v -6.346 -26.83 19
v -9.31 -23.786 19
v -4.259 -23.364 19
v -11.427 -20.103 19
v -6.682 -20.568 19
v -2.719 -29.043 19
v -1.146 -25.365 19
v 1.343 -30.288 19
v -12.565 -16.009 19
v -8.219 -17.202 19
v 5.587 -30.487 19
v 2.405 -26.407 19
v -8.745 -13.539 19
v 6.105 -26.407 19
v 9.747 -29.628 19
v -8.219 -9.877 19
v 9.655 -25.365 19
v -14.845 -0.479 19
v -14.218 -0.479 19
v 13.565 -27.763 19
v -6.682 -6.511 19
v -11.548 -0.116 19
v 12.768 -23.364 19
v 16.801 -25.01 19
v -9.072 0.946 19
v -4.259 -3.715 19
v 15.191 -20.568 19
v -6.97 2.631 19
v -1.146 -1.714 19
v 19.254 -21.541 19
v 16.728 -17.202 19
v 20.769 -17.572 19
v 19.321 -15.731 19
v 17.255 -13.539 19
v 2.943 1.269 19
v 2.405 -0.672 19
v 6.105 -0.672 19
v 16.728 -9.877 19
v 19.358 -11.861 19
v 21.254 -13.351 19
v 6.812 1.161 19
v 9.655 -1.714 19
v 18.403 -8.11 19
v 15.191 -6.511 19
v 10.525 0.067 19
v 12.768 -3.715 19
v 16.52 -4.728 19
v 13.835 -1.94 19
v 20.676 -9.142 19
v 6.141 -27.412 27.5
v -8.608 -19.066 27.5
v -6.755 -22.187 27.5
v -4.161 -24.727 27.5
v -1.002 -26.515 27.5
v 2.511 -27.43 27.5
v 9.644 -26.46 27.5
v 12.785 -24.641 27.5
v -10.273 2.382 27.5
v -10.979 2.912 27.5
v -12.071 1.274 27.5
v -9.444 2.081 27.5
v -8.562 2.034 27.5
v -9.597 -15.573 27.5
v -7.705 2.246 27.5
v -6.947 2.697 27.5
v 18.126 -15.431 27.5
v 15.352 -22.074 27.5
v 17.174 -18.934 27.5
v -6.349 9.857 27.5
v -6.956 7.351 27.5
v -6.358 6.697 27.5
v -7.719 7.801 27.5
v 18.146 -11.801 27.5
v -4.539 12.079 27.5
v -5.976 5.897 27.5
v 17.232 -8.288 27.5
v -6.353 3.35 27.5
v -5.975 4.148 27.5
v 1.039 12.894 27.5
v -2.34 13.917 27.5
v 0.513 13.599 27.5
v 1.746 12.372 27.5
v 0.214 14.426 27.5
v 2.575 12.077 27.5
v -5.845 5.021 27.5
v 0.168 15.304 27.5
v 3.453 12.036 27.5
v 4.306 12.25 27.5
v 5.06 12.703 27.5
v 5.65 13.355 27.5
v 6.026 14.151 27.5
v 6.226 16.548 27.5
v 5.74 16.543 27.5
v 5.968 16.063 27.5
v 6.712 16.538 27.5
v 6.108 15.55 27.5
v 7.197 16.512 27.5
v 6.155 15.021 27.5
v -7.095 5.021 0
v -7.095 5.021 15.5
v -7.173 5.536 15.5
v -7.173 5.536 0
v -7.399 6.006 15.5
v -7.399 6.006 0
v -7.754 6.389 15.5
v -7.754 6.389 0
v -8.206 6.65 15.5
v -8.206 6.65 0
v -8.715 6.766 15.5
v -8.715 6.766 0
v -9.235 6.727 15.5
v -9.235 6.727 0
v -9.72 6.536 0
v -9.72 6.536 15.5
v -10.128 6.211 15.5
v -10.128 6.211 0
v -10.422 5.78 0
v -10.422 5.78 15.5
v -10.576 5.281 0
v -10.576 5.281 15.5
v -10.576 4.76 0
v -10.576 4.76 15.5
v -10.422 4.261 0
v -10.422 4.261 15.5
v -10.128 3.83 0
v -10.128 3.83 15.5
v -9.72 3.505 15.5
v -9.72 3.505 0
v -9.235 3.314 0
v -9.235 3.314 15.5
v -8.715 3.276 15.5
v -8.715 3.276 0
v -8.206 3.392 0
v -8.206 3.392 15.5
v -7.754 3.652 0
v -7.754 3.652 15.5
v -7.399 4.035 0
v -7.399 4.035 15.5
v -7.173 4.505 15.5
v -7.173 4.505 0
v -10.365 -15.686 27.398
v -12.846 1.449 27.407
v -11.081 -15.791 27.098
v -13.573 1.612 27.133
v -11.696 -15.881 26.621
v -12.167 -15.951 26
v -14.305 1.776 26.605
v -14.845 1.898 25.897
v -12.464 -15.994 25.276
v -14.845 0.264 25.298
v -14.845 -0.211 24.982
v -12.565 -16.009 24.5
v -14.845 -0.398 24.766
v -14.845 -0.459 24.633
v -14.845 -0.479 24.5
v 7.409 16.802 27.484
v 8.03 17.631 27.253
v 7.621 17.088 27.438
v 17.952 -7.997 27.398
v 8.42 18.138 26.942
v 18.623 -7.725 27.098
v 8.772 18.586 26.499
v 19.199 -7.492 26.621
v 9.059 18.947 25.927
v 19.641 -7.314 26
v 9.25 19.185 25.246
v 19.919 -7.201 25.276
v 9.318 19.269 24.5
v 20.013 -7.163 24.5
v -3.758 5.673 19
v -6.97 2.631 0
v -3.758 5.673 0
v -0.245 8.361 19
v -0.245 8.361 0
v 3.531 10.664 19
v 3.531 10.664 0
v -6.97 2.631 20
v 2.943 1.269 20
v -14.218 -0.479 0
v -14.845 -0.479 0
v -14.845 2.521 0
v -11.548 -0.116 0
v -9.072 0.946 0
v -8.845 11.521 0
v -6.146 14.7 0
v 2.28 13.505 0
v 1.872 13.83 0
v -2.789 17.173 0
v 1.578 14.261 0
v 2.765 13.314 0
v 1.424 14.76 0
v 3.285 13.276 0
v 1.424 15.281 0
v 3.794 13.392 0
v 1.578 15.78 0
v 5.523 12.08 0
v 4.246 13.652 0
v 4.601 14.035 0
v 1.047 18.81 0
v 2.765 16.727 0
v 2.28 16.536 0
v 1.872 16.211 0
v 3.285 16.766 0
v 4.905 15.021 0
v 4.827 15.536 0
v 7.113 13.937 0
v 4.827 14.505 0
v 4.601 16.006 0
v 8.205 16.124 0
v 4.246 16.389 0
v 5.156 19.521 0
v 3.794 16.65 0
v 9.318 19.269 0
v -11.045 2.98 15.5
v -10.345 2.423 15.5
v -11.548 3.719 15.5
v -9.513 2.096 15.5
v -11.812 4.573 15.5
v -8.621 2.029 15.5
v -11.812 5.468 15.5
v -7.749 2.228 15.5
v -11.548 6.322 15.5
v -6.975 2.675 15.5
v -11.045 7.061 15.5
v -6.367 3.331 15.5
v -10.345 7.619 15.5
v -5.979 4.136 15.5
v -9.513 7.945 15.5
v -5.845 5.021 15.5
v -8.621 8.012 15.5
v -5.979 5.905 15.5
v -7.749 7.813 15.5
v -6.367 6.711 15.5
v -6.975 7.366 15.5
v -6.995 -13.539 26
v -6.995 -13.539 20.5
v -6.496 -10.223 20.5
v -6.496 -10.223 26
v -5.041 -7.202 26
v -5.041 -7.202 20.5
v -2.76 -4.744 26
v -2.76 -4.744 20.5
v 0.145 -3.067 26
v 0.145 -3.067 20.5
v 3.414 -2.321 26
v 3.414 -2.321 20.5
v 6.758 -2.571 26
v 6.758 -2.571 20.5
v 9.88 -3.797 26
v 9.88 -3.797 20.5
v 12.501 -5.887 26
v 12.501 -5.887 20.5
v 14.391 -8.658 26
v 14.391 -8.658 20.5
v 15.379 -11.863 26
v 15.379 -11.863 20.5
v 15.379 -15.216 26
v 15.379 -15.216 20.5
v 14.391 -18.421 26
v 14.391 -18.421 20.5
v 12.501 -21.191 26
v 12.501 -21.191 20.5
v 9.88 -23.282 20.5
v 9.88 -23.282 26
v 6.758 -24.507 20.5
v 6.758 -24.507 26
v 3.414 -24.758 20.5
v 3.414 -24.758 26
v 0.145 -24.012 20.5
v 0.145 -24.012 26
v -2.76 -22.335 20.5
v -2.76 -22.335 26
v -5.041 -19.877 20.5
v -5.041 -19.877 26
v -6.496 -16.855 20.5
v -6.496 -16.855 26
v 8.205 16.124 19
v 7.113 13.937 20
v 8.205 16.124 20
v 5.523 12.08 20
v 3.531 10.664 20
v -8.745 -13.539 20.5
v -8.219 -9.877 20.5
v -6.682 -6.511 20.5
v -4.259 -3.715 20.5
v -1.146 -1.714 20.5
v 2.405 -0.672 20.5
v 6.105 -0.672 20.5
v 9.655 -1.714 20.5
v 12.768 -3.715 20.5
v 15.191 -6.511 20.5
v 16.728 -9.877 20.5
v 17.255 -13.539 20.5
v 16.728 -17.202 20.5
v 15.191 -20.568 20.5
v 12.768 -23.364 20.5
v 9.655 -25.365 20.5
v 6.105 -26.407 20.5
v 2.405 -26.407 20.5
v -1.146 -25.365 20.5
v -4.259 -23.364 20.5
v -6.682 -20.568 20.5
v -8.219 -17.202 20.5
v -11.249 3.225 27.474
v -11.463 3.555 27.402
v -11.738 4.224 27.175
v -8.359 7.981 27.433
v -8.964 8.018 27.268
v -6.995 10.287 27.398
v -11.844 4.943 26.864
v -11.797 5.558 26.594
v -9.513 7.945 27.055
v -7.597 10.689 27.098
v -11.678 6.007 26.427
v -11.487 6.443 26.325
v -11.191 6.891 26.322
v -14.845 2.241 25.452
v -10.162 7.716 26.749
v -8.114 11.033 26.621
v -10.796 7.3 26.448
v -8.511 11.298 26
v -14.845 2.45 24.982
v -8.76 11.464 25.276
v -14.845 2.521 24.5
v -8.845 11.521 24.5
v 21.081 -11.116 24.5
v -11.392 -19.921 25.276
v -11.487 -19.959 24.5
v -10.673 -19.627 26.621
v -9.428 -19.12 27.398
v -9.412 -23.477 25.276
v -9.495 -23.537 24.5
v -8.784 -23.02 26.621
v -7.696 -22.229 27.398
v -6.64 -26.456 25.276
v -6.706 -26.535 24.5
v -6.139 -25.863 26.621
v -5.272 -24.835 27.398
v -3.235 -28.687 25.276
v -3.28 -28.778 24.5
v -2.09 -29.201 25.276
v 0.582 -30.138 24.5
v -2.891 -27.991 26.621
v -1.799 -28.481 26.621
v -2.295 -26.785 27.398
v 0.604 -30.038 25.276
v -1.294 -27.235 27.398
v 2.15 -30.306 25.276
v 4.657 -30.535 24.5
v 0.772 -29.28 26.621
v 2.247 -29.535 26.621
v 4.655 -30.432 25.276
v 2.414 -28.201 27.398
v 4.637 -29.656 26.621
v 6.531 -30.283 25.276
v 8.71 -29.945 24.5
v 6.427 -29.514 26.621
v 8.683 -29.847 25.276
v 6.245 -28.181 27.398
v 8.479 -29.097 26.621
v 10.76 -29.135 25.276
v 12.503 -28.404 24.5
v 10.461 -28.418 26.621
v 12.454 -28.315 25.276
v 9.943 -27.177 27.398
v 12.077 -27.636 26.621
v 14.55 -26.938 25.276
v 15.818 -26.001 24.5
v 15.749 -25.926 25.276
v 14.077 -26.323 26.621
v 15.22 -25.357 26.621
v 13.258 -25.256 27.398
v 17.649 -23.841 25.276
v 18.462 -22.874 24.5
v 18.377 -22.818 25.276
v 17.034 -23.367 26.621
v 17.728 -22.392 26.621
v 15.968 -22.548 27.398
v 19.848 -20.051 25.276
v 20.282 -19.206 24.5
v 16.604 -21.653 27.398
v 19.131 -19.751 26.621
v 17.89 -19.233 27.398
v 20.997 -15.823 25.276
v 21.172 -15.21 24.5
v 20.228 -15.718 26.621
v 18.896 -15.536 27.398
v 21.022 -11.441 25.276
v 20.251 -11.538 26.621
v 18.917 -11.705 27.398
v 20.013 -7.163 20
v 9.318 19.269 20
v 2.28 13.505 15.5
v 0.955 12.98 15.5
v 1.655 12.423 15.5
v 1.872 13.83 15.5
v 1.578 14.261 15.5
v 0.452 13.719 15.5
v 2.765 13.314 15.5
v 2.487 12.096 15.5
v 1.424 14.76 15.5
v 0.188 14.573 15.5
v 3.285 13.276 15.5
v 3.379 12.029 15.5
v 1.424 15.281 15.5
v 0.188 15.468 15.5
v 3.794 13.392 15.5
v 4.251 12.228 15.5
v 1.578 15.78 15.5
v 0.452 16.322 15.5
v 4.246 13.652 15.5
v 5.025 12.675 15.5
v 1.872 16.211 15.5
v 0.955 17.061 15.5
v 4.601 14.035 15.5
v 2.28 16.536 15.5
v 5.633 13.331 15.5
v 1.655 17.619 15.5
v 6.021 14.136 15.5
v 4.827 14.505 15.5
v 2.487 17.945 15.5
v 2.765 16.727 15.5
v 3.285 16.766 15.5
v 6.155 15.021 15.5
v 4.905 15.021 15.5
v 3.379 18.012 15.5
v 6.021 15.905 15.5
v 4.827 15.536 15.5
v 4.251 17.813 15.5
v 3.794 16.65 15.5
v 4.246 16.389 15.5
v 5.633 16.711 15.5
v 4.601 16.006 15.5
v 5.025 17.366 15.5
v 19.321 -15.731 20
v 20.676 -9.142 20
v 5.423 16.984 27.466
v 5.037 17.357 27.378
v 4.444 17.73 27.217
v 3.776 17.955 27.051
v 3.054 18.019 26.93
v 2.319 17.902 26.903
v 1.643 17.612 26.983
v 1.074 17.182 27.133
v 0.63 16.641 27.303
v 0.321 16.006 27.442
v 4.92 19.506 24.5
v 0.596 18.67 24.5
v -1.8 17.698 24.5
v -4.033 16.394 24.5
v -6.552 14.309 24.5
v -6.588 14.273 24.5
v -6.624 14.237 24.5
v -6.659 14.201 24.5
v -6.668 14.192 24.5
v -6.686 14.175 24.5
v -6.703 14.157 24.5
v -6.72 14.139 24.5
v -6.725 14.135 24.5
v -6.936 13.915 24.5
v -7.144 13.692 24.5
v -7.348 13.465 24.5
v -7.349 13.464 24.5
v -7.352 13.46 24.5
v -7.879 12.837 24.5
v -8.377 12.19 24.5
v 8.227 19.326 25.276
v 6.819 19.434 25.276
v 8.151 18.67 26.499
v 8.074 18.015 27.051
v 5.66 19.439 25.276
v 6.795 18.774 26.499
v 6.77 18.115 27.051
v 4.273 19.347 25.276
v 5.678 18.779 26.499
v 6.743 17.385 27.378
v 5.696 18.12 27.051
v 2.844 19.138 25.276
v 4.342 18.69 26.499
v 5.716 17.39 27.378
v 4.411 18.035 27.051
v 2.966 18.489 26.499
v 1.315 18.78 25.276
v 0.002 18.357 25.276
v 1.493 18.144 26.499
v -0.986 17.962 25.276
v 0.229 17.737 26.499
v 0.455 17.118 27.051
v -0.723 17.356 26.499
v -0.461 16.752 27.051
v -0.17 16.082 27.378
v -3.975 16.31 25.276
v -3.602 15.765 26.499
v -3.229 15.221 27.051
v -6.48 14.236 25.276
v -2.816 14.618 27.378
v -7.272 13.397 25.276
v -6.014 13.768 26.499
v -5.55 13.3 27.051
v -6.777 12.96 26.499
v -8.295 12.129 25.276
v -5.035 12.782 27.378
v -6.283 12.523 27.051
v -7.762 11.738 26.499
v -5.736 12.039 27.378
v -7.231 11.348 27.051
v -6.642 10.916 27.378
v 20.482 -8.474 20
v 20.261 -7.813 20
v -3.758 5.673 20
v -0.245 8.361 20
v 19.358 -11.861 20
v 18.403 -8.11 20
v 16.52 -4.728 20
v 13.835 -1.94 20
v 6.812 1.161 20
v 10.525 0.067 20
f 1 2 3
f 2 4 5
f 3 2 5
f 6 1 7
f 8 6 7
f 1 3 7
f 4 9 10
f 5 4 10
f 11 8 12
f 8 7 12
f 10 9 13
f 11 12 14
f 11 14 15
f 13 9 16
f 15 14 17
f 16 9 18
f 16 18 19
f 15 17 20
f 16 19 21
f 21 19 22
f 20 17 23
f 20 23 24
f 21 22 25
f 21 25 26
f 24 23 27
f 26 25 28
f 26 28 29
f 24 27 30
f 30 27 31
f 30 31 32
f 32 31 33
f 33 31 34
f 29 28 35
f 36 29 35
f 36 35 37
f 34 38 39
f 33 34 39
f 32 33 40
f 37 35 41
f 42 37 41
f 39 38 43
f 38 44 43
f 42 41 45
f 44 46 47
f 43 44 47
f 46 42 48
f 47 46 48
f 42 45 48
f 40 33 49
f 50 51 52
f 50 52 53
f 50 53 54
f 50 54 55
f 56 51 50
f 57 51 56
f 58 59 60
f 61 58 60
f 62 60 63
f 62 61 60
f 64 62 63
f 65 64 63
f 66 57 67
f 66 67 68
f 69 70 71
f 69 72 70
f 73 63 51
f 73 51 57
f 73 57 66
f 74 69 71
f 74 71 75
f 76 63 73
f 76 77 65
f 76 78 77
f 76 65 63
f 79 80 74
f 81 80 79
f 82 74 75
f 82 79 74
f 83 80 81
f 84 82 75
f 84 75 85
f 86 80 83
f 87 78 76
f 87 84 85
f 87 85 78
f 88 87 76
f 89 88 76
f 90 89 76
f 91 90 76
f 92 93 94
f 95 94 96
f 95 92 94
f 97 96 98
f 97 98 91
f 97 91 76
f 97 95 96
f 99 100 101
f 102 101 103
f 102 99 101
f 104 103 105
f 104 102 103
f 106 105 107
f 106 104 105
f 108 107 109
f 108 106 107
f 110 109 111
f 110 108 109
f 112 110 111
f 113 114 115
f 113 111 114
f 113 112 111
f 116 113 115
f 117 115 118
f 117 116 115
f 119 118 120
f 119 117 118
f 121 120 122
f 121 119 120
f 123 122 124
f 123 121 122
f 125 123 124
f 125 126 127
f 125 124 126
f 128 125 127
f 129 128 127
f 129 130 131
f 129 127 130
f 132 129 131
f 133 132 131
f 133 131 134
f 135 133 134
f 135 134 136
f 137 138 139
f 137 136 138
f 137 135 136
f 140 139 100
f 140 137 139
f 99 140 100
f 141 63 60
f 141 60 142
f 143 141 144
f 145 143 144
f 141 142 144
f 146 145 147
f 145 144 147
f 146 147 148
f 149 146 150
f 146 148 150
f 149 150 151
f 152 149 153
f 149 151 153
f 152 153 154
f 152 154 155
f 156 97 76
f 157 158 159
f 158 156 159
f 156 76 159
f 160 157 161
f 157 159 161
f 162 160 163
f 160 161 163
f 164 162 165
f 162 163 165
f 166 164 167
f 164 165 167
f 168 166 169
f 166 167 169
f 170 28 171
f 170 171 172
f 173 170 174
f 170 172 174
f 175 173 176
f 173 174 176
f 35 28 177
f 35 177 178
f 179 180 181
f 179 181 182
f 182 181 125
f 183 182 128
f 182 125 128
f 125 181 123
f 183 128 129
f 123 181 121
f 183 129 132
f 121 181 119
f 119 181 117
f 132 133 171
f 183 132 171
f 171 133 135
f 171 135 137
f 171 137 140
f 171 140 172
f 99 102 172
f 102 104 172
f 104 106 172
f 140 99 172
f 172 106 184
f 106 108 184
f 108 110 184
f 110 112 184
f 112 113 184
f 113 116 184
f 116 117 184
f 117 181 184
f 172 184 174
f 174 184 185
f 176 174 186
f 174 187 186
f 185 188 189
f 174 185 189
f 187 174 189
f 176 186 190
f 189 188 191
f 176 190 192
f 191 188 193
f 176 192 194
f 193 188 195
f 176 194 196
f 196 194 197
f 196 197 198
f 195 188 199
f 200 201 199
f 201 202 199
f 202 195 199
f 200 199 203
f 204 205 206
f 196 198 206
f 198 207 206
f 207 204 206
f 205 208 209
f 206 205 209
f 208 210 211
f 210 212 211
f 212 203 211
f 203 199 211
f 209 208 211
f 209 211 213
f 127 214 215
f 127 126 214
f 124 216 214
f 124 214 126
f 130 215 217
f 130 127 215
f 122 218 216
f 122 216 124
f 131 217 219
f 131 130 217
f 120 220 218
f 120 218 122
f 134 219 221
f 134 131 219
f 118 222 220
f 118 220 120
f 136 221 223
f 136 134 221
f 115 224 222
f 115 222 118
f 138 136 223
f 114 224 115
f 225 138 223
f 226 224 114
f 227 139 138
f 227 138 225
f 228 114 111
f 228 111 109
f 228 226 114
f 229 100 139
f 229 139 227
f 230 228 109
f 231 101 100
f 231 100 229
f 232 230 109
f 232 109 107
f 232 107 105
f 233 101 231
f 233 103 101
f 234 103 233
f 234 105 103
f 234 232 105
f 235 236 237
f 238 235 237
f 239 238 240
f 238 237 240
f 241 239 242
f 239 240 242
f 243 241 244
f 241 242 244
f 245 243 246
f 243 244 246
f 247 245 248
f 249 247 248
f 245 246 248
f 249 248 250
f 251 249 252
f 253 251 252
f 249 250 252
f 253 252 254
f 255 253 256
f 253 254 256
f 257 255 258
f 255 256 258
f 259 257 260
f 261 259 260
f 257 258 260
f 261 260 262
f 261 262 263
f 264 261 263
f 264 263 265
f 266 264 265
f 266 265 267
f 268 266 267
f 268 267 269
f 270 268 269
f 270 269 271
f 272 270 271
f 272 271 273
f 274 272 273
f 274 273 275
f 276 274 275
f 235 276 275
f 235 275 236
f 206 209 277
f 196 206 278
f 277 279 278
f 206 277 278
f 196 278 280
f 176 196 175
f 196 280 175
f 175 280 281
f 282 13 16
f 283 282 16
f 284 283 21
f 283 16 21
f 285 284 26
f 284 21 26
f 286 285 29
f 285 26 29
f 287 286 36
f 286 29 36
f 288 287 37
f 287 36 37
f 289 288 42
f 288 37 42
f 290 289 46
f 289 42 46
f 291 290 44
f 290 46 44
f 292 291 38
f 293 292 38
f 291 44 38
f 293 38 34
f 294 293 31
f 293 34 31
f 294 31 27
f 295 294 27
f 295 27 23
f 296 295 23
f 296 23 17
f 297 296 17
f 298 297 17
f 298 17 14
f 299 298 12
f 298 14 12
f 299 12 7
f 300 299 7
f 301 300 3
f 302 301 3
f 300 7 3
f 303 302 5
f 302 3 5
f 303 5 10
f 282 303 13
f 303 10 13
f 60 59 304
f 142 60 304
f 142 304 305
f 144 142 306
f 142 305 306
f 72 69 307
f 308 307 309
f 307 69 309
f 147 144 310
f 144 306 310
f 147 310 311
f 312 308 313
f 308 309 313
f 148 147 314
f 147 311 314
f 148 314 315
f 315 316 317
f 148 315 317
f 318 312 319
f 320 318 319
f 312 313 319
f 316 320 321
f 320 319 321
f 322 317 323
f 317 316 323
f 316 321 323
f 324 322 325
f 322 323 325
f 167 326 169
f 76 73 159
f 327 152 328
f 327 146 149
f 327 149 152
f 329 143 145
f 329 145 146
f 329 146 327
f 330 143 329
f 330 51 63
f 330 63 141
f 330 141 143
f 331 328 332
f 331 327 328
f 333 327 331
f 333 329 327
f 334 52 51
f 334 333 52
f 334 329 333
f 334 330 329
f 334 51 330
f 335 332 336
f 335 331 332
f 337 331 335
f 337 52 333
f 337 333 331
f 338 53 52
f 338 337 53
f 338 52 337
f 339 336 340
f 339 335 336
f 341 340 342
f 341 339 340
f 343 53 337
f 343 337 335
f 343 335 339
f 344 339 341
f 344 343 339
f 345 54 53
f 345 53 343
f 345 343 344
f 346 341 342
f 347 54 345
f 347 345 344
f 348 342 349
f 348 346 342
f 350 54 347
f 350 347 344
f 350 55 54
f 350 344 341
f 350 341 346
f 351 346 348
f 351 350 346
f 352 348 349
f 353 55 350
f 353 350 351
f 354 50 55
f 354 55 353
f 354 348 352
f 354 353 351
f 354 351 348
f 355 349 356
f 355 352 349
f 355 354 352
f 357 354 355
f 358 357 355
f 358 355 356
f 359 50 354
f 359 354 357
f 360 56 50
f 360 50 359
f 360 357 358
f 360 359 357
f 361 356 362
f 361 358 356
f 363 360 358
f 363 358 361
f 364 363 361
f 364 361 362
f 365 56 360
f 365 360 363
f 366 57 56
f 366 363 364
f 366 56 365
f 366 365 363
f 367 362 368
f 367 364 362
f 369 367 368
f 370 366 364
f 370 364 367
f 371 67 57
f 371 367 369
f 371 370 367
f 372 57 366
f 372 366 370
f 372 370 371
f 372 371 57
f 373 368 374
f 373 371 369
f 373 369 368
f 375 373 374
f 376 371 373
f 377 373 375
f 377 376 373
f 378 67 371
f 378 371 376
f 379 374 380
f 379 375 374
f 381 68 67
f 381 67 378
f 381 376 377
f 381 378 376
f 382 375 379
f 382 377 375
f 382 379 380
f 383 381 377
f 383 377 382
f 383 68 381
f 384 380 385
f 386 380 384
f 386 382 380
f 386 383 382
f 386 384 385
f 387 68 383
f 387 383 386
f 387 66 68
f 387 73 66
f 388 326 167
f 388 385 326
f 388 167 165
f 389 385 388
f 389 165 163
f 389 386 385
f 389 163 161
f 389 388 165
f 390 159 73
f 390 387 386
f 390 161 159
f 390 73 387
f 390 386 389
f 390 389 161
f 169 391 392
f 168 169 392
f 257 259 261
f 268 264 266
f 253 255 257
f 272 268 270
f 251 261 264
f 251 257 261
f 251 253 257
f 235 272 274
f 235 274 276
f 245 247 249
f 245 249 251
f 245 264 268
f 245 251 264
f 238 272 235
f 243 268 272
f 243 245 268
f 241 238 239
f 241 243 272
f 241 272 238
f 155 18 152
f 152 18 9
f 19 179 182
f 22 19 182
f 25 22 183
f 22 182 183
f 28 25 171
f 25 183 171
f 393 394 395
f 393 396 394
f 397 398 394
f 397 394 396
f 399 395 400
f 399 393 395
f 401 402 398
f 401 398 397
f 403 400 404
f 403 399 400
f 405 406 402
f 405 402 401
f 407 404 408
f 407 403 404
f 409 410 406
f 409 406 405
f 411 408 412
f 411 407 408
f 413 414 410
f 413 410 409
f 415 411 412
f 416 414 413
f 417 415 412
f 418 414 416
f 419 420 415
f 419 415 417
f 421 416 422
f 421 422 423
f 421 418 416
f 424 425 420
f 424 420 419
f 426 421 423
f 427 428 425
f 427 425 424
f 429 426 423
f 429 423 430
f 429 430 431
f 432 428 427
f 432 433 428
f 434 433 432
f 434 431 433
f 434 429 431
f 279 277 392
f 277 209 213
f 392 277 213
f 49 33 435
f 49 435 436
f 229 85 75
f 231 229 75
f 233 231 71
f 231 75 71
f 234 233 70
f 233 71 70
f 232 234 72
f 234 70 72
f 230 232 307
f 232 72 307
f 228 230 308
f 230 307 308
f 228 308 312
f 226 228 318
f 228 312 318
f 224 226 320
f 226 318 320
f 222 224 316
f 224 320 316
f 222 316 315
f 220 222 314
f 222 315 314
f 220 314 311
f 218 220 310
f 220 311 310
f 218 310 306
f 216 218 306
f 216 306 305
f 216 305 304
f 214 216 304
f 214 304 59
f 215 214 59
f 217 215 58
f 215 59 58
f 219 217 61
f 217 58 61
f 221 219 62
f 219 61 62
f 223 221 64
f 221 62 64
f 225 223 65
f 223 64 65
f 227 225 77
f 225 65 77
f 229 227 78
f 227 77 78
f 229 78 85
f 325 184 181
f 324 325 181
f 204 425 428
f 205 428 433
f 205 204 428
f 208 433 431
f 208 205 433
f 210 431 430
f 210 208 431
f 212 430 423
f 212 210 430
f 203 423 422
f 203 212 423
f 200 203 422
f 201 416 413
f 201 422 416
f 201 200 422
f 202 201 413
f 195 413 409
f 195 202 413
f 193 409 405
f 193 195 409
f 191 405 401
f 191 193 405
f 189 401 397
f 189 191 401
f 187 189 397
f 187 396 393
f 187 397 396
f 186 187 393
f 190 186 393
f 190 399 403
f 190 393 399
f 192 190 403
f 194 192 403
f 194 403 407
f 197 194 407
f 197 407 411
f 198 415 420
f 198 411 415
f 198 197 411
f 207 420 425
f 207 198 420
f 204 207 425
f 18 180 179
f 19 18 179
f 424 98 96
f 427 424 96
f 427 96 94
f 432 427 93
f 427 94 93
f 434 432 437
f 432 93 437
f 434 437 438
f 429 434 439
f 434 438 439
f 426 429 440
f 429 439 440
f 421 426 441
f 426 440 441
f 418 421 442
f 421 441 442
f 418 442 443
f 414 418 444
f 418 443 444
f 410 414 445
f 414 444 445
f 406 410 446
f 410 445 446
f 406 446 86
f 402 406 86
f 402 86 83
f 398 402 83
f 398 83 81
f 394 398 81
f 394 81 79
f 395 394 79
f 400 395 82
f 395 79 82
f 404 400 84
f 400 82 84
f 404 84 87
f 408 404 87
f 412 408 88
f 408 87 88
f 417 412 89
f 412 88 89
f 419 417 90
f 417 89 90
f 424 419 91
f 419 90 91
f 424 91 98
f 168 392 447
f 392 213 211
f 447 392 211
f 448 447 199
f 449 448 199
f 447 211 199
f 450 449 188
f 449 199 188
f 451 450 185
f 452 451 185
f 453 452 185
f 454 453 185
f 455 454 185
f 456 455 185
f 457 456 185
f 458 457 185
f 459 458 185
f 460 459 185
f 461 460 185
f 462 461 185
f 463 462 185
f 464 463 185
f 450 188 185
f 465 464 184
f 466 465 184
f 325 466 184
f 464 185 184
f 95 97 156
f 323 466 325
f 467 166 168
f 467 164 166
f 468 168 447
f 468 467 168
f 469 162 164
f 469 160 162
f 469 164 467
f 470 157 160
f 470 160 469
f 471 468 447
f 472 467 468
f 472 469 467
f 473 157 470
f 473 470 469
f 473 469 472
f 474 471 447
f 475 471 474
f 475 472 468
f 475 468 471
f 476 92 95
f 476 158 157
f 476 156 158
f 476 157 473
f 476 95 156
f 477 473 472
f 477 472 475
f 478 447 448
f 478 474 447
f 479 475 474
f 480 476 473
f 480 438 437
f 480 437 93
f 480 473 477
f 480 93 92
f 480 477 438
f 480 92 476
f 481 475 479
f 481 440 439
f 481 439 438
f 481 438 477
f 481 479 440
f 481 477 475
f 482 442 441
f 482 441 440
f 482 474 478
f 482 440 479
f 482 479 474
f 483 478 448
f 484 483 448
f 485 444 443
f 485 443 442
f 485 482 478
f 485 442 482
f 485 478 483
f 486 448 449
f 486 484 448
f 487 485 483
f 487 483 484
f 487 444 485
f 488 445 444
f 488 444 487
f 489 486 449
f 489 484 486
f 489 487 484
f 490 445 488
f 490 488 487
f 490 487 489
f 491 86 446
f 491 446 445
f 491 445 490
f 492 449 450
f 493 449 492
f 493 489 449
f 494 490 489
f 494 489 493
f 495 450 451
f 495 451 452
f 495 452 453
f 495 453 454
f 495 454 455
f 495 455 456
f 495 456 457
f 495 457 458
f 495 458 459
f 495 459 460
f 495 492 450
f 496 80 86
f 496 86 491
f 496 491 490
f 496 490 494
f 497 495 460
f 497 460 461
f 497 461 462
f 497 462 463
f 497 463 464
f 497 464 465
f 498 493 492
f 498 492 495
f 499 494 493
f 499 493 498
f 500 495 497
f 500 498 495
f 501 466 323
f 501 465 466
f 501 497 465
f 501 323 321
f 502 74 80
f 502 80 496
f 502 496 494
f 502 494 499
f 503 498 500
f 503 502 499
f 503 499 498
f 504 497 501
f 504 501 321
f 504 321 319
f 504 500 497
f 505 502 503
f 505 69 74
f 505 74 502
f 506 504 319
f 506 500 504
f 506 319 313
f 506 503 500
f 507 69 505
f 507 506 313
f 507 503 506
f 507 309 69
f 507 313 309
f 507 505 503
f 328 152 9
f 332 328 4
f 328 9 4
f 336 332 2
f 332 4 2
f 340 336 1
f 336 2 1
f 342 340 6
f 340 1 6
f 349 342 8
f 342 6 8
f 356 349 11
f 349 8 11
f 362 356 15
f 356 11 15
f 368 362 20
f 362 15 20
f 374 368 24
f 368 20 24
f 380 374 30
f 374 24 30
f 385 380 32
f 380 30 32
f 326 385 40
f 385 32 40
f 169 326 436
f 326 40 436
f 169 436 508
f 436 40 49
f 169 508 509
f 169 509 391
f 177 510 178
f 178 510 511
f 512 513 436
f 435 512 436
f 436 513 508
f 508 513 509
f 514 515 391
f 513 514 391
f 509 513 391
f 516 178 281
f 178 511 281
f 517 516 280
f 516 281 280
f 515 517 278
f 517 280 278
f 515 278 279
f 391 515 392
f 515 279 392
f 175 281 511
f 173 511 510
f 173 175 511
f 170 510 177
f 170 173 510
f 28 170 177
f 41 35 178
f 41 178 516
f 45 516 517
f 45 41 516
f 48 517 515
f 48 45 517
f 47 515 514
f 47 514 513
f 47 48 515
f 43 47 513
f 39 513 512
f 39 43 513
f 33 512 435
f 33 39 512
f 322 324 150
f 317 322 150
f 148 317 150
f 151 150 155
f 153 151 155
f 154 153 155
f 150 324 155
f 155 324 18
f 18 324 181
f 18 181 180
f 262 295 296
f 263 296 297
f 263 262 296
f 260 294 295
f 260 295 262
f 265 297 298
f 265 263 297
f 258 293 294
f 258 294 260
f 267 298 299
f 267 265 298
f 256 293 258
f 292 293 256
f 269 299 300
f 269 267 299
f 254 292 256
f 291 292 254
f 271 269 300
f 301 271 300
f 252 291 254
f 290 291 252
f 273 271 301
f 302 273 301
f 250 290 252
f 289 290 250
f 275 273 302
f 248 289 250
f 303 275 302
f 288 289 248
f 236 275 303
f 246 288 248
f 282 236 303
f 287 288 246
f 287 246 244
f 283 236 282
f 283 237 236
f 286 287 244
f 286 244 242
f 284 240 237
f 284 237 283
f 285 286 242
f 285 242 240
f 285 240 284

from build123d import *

# Parameters (mm, degrees)
SKETCH1_R                = 1.75
BOSS_EXTRUDE1_DEPTH      = 23
FILLET3_R                = 10
BOSS_EXTRUDE2_DEPTH      = 4.5
BOSS_EXTRUDE2_DEPTH_BACK = 4
SKETCH3_R                = 1.75
SKETCH4_R                = 11.25
CUT_EXTRUDE1_DEPTH       = 7
SKETCH5_R                = 13
CUT_EXTRUDE2_DEPTH       = 1.5
SKETCH6_R                = 3
CUT_EXTRUDE3_DEPTH       = 12
CUT_EXTRUDE4_DEPTH       = 1
FILLET7_R                = 3
FILLET8_R                = 10


with BuildPart() as part:
    # Sketch1 → Boss-Extrude1 (new body)
    with BuildSketch(Plane.XY):
        with BuildLine():
            Line((-8.845360825, 11.520618557), (-14.845360825, 2.520618557))
            Line((-14.845360825, 2.520618557), (-14.845360825, -0.479381443))
            Line((-14.845360825, -0.479381443), (-9.845360825, -0.479381443))
            Line((-9.845360825, -0.479381443), (-8.845360825, 0.520618557))
            ThreePointArc((-8.845360825, 0.520618557), (-1.696742799, 7.320595709), (6.83903909, 12.26861112))
            Line((6.83903909, 12.26861112), (9.318301605, 19.26861112))
            ThreePointArc((9.318301605, 19.26861112), (-0.918731235, 18.102760488), (-8.845360825, 11.520618557))
        make_face()
        with Locations((-8.845360825, 5.020618557)):
            Circle(SKETCH1_R, mode=Mode.SUBTRACT)
        with Locations((3.154639175, 15.020618557)):
            Circle(SKETCH1_R, mode=Mode.SUBTRACT)
    extrude(amount=BOSS_EXTRUDE1_DEPTH)

    # Fillet3
    # the kernel refuses this fillet: 10 mm, written as the material it takes off along each edge
    with BuildSketch(Plane(origin=(-9.845360825, -0.479381443, -10.932362995), x_dir=(-1, 0, 0), z_dir=(0, 0, 1))) as fillet3_piece_1:
        with BuildLine():
            CenterArc((4.372945198, -10), FILLET3_R, 90, 46.455884642)
            Line((-2.87549632, -3.110871204), (-3.600340471, -2.421958325))
            ThreePointArc((-3.600340471, -2.421958325), (-1.769425443, -0.361263367), (-0.707106781, 0.707106781))
            Line((-0.707106781, 0.707106781), (0, 1))
            Line((0, 1), (4.372945198, 1))
            Line((4.372945198, 1), (4.372945198, 0))
        make_face()
    extrude(amount=44.86472599, mode=Mode.SUBTRACT)

    # Sketch3 → Boss-Extrude2 (add, two sides: drawn at the far end of the back side and taken through both)
    with BuildSketch(Plane.XY.offset(23).offset(-BOSS_EXTRUDE2_DEPTH_BACK)):
        with BuildLine():
            Line((-14.845360825, 2.520618557), (-14.845360825, -0.479381443))
            Line((-14.845360825, -0.479381443), (-12.565000182, -16.009144975))
            ThreePointArc((-12.565000182, -16.009144975), (8.709502938, -29.945300767), (20.013420995, -7.162799635))
            Line((20.013420995, -7.162799635), (9.318301605, 19.26861112))
            ThreePointArc((9.318301605, 19.26861112), (-0.918731235, 18.102760488), (-8.845360825, 11.520618557))
            Line((-8.845360825, 11.520618557), (-14.845360825, 2.520618557))
        make_face()
        with Locations((3.154639175, 15.020618557)):
            Circle(SKETCH3_R, mode=Mode.SUBTRACT)
        with Locations((-8.845360825, 5.020618557)):
            Circle(SKETCH3_R, mode=Mode.SUBTRACT)
    extrude(amount=BOSS_EXTRUDE2_DEPTH + BOSS_EXTRUDE2_DEPTH_BACK)

    # Sketch4 → Cut-Extrude1 (cut)
    with BuildSketch(Plane(origin=(0, 0, 19), x_dir=(-1, 0, 0), z_dir=(0, 0, -1))):
        with Locations((-4.254639175, -13.539381443)):
            Circle(SKETCH4_R)
    extrude(amount=-CUT_EXTRUDE1_DEPTH, mode=Mode.SUBTRACT)

    # Sketch5 → Cut-Extrude2 (cut)
    with BuildSketch(Plane(origin=(0, 0, 19), x_dir=(-1, 0, 0), z_dir=(0, 0, -1))):
        with Locations((-4.254639175, -13.539381443)):
            Circle(SKETCH5_R)
    extrude(amount=-CUT_EXTRUDE2_DEPTH, mode=Mode.SUBTRACT)

    # Sketch6 → Cut-Extrude3 (cut)
    with BuildSketch(Plane.XY.offset(27.5)):
        with Locations((-8.845360825, 5.020618557)):
            Circle(SKETCH6_R)
        with Locations((3.154639175, 15.020618557)):
            Circle(SKETCH6_R)
    extrude(amount=-CUT_EXTRUDE3_DEPTH, mode=Mode.SUBTRACT)

    # Sketch7 → Cut-Extrude4 (cut)
    with BuildSketch(Plane(origin=(0, 0, 19), x_dir=(-1, 0, 0), z_dir=(0, 0, -1))):
        with BuildLine():
            Line((-19.320512006, -15.73138888), (-26.521187379, 19.26861112))
            Line((-26.521187379, 19.26861112), (-9.318301605, 19.26861112))
            Line((-9.318301605, 19.26861112), (-6.83903909, 12.26861112))
            ThreePointArc((-6.83903909, 12.26861112), (0.552528201, 8.148031782), (6.969864505, 2.631489761))
            Line((6.969864505, 2.631489761), (-2.943055137, 1.26861112))
            ThreePointArc((-2.943055137, 1.26861112), (-15.267616881, -3.247010549), (-19.320512006, -15.73138888))
        make_face()
    extrude(amount=-CUT_EXTRUDE4_DEPTH, mode=Mode.SUBTRACT)

    # Fillet7
    # the kernel refuses this fillet: 3 mm, written as the material it takes off along each edge
    with BuildSketch(Plane(origin=(-8.845360825, 11.520618557, 27.5), x_dir=(0, 0, -1), z_dir=(-0.554700196225229, -0.8320502943378438, 0))) as fillet7_piece_1:
        with BuildLine():
            CenterArc((FILLET7_R, FILLET7_R), FILLET7_R, 180, 90)
            Line((0, FILLET7_R), (0, 0))
            Line((0, 0), (FILLET7_R, 0))
        make_face()
    extrude(amount=18.316653826, mode=Mode.SUBTRACT)
    with BuildSketch(Plane(origin=(-18.114165499, 21.781905941, 27.5), x_dir=(0, 0, -1), z_dir=(0.14528020772302286, -0.9893905504116943, 0))) as fillet7_piece_2:
        with BuildLine():
            CenterArc((FILLET7_R, FILLET7_R), FILLET7_R, 180, 90)
            Line((0, FILLET7_R), (0, 0))
            Line((0, 0), (FILLET7_R, 0))
        make_face()
    extrude(amount=38.196292556, mode=Mode.SUBTRACT)
    with BuildSketch(Plane(origin=(4.254639175, -13.539381443, 27.5), x_dir=(-0.9893905504116943, -0.14528020772302197, 0), z_dir=(-0.14528020772302197, 0.9893905504116943, 0))) as fillet7_piece_3:
        with BuildLine():
            CenterArc((17 - FILLET7_R, -FILLET7_R), FILLET7_R, 0, 90)
            Line((17 - FILLET7_R, 0), (17, 0))
            Line((17, 0), (17, -FILLET7_R))
        make_face()
    revolve(axis=Axis((4.254639175, -13.539381443, 27.5), (0, 0, 1)), revolution_arc=193.67655813, mode=Mode.SUBTRACT)
    with BuildSketch(Plane(origin=(6.154639175, 1.520618557, 27.5), x_dir=(0.5584515746383966, 0.8295371232102247, 0), z_dir=(0.8295371232102247, -0.5584515746383966, 0))) as fillet7_piece_4:
        with BuildLine():
            CenterArc((18.027756377 - FILLET7_R, -FILLET7_R), FILLET7_R, 0, 90)
            Line((18.027756377 - FILLET7_R, 0), (18.027756377, 0))
            Line((18.027756377, 0), (18.027756377, -FILLET7_R))
        make_face()
    revolve(axis=Axis((6.154639175, 1.520618557, 27.5), (0, 0, 1)), revolution_arc=90.258713785, mode=Mode.SUBTRACT)
    with BuildSketch(Plane(origin=(20.013420995, -7.162799635, 27.5), x_dir=(-0.9269871658598542, -0.3750930475643543, 0), z_dir=(-0.37509304756435435, 0.9269871658598543, 0))) as fillet7_piece_5:
        with BuildLine():
            CenterArc((FILLET7_R, -FILLET7_R), FILLET7_R, 90, 90)
            Line((0, -FILLET7_R), (0, 0))
            Line((0, 0), (FILLET7_R, 0))
        make_face()
    extrude(amount=36.013243471, mode=Mode.SUBTRACT)

    # Fillet8
    fillet8_edges = [part.edges().sort_by_distance(p)[0] for p in [
        (6.83903909, 12.26861112, 10),
    ]]
    fillet(fillet8_edges, radius=FILLET8_R)


solid = part.part
